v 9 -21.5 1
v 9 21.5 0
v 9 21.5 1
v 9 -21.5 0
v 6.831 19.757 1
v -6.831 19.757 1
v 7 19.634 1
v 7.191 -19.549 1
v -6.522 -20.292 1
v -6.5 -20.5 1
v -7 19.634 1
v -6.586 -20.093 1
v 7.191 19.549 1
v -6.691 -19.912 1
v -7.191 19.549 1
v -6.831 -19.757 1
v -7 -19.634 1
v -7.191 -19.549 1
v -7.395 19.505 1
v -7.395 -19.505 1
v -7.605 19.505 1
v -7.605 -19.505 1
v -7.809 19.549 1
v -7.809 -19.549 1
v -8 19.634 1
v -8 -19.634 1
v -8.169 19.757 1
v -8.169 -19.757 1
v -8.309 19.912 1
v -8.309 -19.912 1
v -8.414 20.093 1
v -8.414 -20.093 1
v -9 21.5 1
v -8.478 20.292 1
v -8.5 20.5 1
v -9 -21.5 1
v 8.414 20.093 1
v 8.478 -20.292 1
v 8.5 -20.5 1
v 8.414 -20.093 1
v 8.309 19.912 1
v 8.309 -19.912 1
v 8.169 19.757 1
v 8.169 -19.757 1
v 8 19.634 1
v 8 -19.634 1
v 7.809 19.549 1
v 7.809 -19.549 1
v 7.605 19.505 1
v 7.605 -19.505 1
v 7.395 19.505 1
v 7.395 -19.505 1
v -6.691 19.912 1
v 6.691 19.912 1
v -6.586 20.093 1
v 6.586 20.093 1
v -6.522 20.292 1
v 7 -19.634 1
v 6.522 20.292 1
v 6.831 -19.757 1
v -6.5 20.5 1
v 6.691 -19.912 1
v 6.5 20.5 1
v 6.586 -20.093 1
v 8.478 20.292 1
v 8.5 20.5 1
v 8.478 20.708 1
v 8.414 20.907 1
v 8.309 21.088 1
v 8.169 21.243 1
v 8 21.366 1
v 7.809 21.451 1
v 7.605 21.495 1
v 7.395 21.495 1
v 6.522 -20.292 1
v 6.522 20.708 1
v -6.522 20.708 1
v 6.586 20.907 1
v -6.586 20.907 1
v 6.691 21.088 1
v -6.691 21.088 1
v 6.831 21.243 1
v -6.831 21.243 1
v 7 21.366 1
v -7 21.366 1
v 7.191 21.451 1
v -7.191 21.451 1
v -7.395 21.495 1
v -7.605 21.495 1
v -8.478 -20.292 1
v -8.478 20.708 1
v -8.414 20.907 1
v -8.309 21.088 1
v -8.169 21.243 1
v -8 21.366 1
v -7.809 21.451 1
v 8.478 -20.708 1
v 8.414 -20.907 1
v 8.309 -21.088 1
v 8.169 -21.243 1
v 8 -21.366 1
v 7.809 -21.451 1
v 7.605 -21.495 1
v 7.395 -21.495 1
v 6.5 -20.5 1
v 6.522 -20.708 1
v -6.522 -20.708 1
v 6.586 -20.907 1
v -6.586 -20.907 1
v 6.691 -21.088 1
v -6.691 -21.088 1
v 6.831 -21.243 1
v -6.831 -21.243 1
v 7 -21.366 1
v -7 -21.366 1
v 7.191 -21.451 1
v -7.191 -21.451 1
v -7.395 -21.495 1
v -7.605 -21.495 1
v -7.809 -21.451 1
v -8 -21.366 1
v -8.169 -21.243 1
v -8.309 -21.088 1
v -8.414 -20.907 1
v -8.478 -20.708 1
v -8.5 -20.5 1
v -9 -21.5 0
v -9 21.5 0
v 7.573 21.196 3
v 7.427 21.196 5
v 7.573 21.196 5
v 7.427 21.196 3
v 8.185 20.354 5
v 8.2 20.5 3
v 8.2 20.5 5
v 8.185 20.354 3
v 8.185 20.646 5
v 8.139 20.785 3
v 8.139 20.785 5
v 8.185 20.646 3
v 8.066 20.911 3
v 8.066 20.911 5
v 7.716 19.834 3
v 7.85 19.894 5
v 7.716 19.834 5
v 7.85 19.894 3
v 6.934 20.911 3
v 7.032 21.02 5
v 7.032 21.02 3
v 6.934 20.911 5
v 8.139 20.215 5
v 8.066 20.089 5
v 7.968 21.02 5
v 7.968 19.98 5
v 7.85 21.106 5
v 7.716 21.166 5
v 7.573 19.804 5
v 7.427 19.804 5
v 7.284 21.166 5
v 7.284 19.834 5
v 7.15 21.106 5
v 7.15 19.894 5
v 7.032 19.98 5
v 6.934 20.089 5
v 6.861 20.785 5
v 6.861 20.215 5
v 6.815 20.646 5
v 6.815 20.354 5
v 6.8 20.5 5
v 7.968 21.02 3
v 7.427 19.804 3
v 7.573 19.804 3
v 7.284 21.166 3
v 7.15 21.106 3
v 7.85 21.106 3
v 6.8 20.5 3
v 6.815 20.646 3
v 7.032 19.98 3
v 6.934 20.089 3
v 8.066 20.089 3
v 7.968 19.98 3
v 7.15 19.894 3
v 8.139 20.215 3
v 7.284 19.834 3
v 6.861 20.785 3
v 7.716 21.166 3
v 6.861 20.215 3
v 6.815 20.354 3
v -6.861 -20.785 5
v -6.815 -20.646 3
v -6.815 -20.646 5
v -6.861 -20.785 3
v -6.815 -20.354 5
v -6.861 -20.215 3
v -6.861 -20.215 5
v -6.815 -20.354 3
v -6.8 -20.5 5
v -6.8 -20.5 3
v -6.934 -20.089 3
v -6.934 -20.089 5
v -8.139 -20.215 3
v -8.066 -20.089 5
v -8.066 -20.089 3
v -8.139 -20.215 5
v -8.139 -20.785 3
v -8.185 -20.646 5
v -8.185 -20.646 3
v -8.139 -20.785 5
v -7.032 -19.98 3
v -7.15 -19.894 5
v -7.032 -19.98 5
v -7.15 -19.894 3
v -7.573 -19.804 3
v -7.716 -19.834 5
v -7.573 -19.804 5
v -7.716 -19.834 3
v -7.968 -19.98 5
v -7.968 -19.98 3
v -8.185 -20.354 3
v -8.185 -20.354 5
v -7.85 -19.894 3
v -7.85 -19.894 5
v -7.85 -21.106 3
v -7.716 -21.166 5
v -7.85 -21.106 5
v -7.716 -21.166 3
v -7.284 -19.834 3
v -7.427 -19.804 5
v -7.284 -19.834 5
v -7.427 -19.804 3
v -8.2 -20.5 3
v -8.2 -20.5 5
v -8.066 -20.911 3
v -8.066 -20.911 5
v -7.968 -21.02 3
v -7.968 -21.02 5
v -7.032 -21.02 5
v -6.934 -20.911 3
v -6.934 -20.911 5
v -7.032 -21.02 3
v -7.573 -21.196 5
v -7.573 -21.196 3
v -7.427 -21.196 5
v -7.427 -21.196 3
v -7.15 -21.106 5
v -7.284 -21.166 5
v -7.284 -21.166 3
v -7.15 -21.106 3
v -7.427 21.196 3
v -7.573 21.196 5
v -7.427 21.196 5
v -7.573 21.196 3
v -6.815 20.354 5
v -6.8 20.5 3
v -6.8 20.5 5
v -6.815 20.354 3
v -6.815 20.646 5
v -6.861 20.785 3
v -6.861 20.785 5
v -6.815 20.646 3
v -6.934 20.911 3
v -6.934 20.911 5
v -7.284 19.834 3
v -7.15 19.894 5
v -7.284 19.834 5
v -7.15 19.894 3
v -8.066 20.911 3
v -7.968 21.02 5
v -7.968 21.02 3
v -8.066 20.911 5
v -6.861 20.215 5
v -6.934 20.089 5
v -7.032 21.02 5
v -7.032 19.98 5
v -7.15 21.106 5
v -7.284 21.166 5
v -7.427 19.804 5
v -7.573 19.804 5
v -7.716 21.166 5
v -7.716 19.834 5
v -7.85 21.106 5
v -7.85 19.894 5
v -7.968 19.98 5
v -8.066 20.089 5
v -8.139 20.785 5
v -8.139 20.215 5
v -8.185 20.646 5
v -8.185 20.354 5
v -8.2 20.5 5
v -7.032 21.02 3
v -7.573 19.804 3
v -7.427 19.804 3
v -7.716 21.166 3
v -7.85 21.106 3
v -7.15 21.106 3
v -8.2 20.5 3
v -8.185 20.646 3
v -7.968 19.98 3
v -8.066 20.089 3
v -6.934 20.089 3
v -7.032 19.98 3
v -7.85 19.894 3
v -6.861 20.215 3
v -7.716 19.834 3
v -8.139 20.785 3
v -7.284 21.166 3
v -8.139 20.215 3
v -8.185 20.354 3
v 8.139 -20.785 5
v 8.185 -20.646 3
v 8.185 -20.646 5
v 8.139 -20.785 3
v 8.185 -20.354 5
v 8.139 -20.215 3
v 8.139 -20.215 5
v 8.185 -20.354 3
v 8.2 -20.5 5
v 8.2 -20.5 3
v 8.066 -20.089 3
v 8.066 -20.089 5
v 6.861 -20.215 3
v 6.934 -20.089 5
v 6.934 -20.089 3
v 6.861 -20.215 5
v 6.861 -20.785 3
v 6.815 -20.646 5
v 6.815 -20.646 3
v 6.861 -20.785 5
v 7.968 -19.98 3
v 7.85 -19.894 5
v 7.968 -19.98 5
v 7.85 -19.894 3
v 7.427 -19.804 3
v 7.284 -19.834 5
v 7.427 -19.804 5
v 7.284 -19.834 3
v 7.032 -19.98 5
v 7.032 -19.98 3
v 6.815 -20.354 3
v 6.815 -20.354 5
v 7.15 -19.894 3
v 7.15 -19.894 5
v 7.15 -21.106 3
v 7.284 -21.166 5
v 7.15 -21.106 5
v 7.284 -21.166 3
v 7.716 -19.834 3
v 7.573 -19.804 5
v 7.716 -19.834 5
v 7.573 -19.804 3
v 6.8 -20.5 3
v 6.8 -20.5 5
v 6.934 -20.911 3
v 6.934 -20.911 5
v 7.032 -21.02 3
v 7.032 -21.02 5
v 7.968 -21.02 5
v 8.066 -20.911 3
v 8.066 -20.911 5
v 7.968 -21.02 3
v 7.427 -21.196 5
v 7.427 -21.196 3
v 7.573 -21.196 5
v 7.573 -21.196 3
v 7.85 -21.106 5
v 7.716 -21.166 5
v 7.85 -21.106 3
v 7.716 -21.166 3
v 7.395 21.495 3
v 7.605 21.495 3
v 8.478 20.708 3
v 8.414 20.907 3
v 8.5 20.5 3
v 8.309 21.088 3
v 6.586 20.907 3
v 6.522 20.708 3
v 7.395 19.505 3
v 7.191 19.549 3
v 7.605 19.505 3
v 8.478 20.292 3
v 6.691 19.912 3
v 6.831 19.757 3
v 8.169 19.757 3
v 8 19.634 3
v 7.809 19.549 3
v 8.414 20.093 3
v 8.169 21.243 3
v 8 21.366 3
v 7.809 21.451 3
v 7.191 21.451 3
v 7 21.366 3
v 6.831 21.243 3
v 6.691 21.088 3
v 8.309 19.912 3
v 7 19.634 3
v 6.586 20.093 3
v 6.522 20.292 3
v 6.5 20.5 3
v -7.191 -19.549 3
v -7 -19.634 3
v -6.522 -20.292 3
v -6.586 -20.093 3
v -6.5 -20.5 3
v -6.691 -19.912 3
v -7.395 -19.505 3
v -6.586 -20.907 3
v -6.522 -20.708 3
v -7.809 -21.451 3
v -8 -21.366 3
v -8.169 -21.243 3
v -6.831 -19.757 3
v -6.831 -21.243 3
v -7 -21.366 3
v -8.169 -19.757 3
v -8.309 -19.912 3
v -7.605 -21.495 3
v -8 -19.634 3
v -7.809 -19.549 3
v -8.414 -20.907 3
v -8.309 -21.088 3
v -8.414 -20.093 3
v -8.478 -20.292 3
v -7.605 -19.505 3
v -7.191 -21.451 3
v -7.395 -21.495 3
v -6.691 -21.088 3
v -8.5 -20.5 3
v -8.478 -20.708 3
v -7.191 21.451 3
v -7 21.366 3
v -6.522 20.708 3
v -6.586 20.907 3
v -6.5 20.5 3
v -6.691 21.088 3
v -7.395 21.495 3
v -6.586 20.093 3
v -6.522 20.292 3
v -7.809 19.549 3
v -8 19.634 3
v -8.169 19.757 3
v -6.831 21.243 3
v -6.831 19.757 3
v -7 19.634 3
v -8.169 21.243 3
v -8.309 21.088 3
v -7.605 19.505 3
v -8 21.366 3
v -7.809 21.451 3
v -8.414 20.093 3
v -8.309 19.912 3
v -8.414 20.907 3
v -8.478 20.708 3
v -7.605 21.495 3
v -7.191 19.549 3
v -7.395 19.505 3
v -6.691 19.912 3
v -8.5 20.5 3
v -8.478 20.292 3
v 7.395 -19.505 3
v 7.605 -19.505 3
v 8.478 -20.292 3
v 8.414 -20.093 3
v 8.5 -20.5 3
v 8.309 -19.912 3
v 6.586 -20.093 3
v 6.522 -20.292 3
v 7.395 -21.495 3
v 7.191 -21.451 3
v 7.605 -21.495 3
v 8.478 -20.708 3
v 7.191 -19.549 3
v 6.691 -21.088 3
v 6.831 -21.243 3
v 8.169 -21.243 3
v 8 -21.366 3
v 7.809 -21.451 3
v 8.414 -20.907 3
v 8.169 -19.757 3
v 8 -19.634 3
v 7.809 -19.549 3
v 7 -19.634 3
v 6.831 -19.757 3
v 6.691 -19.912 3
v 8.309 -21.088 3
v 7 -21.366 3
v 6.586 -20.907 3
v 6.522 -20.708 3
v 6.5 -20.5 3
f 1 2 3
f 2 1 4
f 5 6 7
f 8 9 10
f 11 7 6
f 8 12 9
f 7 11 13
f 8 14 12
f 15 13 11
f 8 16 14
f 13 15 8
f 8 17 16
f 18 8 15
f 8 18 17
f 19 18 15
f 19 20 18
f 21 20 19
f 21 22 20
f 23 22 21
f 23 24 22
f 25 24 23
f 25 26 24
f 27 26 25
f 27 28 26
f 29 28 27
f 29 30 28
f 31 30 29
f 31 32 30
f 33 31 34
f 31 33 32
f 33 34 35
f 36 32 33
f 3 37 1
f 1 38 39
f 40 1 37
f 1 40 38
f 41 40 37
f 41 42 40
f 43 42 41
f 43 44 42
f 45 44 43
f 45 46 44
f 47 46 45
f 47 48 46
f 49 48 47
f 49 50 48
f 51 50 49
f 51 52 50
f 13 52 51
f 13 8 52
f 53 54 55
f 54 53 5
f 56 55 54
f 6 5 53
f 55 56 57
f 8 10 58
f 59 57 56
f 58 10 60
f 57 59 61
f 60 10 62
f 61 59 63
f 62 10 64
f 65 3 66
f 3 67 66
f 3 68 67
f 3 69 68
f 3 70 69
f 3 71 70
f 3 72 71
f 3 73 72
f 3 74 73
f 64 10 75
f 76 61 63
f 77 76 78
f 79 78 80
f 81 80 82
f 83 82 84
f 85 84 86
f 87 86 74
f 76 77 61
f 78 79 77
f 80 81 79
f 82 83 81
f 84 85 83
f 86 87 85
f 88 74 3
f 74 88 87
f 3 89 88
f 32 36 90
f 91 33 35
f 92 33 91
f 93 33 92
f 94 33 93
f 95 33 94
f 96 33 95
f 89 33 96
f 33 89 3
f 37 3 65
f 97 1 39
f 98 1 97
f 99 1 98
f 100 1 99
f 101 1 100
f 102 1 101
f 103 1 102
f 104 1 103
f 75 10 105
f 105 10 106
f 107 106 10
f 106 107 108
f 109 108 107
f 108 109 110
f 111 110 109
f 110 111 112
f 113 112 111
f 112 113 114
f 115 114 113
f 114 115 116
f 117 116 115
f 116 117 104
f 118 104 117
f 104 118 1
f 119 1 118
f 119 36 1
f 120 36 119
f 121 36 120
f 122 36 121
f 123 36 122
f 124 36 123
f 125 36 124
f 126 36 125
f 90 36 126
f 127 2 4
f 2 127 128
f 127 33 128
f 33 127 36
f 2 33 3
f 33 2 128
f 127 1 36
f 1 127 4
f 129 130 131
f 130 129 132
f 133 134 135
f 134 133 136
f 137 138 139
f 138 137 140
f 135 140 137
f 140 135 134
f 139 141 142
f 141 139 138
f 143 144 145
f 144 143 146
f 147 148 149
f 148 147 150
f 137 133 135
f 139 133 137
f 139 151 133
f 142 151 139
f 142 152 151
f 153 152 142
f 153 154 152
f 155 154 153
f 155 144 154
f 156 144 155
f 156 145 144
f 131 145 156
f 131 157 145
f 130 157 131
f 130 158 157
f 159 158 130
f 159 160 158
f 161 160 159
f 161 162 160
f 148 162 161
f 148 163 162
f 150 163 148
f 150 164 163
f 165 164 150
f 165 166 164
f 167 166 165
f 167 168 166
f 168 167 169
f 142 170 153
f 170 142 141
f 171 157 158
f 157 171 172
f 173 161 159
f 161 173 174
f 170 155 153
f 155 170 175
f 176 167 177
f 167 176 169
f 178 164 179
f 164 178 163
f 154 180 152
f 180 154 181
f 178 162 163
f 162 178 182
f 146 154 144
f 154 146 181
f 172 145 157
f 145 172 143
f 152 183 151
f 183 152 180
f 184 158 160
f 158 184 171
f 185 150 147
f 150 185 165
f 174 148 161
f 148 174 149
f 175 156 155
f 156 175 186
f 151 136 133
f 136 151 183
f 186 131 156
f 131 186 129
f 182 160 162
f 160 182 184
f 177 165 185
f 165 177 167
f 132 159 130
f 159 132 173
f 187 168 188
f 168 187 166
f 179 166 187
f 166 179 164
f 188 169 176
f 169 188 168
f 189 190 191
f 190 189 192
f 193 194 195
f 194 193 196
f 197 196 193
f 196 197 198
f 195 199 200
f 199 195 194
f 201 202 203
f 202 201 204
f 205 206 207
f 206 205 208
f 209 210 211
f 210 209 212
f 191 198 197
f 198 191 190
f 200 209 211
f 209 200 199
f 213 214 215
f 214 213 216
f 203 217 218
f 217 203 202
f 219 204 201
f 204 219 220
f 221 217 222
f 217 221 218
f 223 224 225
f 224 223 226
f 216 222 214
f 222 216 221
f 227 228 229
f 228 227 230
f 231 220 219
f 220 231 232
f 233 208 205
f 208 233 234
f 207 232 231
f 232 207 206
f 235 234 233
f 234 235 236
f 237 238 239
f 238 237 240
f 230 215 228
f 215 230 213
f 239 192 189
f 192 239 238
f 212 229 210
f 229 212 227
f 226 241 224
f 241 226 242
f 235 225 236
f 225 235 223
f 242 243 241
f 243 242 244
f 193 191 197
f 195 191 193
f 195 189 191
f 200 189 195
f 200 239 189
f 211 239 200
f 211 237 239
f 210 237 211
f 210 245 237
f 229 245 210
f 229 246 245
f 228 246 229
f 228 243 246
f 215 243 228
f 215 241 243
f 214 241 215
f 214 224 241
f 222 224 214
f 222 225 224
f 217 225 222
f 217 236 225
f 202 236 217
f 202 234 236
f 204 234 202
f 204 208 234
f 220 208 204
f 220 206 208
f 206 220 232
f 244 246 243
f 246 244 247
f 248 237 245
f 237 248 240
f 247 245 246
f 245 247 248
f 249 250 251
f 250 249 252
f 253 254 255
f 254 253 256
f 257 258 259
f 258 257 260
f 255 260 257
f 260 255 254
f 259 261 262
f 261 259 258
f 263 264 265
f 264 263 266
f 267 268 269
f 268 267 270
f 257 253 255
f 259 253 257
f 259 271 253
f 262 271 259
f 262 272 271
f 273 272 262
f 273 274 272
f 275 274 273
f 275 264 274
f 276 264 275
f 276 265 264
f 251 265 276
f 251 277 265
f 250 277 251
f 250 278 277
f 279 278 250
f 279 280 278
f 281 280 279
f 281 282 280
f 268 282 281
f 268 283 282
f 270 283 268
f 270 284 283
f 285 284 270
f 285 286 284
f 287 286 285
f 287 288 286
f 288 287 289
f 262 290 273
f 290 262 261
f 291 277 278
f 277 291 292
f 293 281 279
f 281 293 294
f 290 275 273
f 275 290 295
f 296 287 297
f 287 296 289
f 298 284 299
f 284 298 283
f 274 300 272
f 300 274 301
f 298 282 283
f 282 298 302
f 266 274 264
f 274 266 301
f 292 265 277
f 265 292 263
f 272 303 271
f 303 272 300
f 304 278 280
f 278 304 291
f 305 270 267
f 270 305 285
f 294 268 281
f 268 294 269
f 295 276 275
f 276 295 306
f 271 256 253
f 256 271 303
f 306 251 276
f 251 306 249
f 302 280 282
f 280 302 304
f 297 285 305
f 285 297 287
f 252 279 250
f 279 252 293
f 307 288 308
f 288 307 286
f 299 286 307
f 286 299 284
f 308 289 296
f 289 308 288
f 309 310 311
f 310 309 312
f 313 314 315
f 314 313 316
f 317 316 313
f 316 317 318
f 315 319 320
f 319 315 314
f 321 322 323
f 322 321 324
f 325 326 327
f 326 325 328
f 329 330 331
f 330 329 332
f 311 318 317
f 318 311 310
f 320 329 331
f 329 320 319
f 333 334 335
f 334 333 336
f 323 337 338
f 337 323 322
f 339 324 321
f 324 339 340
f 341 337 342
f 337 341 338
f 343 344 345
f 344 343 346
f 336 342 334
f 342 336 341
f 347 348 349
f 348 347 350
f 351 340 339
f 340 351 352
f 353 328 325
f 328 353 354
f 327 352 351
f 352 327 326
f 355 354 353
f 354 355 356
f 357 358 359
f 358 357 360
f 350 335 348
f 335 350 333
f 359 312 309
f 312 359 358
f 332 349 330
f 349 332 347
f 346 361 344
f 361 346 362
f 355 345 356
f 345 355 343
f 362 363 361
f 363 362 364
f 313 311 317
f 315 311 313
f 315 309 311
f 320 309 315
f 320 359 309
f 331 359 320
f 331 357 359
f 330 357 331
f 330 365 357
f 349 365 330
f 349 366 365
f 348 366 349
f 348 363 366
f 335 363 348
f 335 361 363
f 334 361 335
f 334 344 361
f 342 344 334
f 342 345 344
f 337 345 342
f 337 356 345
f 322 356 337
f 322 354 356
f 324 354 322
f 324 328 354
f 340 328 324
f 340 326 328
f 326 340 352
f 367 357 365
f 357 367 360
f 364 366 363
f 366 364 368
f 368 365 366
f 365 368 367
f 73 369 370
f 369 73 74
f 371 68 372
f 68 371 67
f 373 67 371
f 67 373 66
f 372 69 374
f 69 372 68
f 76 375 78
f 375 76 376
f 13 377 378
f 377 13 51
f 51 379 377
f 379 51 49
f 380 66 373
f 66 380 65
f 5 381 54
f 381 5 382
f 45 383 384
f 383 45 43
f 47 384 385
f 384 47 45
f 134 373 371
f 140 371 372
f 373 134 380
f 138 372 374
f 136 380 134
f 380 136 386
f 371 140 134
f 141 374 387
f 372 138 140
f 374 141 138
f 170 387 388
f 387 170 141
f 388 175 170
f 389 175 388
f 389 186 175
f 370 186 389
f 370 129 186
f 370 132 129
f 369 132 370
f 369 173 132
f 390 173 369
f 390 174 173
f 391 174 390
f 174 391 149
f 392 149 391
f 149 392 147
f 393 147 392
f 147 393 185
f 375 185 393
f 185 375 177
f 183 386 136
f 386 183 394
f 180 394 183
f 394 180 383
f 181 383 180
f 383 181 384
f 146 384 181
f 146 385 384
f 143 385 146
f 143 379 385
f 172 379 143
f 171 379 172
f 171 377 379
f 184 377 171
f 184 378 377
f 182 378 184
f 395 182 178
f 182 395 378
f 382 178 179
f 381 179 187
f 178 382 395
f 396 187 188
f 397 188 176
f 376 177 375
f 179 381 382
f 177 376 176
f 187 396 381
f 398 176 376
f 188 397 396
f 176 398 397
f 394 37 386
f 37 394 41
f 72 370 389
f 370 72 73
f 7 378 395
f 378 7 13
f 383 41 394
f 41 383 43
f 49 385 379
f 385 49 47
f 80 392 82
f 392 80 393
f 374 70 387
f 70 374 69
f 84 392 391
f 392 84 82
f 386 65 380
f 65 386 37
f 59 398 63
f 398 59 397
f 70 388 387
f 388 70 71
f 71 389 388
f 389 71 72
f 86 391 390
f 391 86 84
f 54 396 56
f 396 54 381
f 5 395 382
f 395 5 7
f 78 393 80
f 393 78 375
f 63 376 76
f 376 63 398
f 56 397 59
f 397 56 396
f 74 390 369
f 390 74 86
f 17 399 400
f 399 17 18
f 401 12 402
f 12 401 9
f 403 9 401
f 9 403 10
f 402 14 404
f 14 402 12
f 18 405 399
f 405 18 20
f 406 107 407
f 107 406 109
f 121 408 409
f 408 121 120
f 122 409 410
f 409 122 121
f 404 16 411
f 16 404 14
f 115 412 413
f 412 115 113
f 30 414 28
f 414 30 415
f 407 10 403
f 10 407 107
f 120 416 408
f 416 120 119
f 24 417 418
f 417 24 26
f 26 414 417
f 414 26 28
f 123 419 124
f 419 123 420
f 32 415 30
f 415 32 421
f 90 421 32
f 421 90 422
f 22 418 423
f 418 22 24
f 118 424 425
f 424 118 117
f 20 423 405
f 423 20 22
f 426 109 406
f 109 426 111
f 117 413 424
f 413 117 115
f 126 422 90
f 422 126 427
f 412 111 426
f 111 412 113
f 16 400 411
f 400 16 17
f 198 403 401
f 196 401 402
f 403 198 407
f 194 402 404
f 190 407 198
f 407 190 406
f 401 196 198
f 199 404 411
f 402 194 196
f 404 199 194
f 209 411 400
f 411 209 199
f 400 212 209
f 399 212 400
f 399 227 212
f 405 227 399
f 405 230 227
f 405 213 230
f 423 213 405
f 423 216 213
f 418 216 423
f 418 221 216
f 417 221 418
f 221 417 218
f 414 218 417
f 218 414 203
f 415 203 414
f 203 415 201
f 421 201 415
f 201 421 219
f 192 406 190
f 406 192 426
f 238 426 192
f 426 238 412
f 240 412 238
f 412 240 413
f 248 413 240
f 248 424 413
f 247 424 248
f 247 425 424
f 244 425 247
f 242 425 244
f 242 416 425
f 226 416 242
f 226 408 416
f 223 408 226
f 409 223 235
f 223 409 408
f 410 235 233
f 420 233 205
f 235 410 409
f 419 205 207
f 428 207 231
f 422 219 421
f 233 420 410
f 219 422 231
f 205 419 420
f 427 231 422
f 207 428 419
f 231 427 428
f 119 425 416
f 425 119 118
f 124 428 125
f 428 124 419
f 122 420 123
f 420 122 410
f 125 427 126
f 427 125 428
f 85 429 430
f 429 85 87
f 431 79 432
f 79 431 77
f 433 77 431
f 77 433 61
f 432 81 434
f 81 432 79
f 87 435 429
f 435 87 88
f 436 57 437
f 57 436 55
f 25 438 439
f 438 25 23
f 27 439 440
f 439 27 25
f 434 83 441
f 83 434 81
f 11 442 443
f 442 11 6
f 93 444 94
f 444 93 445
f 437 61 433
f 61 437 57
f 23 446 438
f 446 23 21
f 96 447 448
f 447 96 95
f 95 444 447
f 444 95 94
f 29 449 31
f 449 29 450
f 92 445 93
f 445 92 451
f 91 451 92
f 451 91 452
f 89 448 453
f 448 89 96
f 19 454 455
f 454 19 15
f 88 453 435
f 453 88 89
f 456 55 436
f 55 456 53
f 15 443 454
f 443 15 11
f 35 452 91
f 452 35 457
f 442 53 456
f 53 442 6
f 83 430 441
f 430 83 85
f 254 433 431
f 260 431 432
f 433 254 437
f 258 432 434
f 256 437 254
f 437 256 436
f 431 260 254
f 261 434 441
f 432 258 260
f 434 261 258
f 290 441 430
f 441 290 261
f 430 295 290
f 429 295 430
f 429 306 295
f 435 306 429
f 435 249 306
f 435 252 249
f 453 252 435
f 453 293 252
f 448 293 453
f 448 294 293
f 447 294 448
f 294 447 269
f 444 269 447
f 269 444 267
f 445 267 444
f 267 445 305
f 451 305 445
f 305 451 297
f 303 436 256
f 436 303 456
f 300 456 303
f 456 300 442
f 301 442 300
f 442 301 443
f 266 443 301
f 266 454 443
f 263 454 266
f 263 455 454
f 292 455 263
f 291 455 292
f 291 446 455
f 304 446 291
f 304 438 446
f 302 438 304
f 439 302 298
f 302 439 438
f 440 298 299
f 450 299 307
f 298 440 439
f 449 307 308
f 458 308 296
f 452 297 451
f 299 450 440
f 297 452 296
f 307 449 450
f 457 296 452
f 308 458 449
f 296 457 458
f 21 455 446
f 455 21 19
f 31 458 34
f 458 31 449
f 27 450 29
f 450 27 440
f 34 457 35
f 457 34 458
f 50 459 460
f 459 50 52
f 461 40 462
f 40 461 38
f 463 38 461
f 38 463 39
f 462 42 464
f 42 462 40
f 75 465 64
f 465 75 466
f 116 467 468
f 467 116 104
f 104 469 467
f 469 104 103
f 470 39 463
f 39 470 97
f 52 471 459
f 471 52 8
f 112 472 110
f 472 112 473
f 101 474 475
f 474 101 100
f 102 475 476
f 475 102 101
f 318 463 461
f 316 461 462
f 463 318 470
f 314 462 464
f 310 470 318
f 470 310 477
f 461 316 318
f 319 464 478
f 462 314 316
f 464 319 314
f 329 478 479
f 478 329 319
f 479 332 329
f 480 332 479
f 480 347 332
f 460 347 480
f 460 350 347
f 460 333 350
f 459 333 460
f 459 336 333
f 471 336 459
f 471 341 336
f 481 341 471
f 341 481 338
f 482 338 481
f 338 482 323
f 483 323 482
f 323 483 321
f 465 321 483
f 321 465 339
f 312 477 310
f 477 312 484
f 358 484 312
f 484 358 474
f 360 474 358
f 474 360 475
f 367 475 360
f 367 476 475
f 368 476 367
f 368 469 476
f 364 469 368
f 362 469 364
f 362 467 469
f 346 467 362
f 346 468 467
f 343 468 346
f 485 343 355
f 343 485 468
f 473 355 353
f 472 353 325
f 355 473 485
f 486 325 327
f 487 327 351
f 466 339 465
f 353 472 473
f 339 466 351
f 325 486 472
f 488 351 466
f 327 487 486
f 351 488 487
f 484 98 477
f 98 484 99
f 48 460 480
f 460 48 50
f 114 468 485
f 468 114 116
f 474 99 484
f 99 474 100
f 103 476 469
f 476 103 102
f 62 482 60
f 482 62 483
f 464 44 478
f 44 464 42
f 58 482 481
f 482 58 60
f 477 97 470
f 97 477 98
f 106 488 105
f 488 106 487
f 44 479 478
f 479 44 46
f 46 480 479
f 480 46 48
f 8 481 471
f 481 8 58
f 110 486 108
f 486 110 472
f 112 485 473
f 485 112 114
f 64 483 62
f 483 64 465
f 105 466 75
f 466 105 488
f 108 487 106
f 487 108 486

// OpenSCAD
//translate([0,6,0]) nano();
 //rc522();
nano();

module nano() {
    translate([0,0,0.5]) cube([18,43,1], true);

a  = 7.5;
b  = 20.5;
r = 0.7;
translate([a,b,0])
    cylinder(5,r,r,false, $fn=30);

translate([-a,-b,0])
    cylinder(5,r,r,false, $fn=30);

translate([-a,b,0])
    cylinder(5,r,r,false, $fn=30);

translate([a,-b,0])
    cylinder(5,r,r,false, $fn=30);

translate([a,b,0])
    cylinder(3,1,1,false, $fn=30);

translate([-a,-b,0])
    cylinder(3,1,1,false, $fn=30);

translate([-a,b,0])
    cylinder(3,1,1,false, $fn=30);

translate([a,-b,0])
    cylinder(3,1,1,false, $fn=30);
}

module rc522() {
    translate([17,0,0])
    cylinder(4,1.5,1.5,false, $fn=30);
    
translate([-17,0,0])
    cylinder(4,1.5,1.5,false, $fn=30);
    
translate([12.5,37,0])
    cylinder(4,1.5,1.5,false, $fn=30);    
    
translate([-12.5,37,0])
    cylinder(4,1.5,1.5,false, $fn=30);    
    
rotate([0,0,-7]) translate([-17,17,1])    
    cube([5,43,2],true);
rotate([0,0,7])  translate([17,17,1])  
    cube([5,43,2],true);
    
//translate([-15,25,0])       cube([5,15,2],false);
//translate([10,25,0])  cube([5,15,2],false);
    
translate([0,25.5,1])   
    cube([58.5,4,2],true);

translate([0,4,1])   
    cube([58.5,4,2],true);

//translate([0,6,0.4]) cube([18,43,.8], true);
}
